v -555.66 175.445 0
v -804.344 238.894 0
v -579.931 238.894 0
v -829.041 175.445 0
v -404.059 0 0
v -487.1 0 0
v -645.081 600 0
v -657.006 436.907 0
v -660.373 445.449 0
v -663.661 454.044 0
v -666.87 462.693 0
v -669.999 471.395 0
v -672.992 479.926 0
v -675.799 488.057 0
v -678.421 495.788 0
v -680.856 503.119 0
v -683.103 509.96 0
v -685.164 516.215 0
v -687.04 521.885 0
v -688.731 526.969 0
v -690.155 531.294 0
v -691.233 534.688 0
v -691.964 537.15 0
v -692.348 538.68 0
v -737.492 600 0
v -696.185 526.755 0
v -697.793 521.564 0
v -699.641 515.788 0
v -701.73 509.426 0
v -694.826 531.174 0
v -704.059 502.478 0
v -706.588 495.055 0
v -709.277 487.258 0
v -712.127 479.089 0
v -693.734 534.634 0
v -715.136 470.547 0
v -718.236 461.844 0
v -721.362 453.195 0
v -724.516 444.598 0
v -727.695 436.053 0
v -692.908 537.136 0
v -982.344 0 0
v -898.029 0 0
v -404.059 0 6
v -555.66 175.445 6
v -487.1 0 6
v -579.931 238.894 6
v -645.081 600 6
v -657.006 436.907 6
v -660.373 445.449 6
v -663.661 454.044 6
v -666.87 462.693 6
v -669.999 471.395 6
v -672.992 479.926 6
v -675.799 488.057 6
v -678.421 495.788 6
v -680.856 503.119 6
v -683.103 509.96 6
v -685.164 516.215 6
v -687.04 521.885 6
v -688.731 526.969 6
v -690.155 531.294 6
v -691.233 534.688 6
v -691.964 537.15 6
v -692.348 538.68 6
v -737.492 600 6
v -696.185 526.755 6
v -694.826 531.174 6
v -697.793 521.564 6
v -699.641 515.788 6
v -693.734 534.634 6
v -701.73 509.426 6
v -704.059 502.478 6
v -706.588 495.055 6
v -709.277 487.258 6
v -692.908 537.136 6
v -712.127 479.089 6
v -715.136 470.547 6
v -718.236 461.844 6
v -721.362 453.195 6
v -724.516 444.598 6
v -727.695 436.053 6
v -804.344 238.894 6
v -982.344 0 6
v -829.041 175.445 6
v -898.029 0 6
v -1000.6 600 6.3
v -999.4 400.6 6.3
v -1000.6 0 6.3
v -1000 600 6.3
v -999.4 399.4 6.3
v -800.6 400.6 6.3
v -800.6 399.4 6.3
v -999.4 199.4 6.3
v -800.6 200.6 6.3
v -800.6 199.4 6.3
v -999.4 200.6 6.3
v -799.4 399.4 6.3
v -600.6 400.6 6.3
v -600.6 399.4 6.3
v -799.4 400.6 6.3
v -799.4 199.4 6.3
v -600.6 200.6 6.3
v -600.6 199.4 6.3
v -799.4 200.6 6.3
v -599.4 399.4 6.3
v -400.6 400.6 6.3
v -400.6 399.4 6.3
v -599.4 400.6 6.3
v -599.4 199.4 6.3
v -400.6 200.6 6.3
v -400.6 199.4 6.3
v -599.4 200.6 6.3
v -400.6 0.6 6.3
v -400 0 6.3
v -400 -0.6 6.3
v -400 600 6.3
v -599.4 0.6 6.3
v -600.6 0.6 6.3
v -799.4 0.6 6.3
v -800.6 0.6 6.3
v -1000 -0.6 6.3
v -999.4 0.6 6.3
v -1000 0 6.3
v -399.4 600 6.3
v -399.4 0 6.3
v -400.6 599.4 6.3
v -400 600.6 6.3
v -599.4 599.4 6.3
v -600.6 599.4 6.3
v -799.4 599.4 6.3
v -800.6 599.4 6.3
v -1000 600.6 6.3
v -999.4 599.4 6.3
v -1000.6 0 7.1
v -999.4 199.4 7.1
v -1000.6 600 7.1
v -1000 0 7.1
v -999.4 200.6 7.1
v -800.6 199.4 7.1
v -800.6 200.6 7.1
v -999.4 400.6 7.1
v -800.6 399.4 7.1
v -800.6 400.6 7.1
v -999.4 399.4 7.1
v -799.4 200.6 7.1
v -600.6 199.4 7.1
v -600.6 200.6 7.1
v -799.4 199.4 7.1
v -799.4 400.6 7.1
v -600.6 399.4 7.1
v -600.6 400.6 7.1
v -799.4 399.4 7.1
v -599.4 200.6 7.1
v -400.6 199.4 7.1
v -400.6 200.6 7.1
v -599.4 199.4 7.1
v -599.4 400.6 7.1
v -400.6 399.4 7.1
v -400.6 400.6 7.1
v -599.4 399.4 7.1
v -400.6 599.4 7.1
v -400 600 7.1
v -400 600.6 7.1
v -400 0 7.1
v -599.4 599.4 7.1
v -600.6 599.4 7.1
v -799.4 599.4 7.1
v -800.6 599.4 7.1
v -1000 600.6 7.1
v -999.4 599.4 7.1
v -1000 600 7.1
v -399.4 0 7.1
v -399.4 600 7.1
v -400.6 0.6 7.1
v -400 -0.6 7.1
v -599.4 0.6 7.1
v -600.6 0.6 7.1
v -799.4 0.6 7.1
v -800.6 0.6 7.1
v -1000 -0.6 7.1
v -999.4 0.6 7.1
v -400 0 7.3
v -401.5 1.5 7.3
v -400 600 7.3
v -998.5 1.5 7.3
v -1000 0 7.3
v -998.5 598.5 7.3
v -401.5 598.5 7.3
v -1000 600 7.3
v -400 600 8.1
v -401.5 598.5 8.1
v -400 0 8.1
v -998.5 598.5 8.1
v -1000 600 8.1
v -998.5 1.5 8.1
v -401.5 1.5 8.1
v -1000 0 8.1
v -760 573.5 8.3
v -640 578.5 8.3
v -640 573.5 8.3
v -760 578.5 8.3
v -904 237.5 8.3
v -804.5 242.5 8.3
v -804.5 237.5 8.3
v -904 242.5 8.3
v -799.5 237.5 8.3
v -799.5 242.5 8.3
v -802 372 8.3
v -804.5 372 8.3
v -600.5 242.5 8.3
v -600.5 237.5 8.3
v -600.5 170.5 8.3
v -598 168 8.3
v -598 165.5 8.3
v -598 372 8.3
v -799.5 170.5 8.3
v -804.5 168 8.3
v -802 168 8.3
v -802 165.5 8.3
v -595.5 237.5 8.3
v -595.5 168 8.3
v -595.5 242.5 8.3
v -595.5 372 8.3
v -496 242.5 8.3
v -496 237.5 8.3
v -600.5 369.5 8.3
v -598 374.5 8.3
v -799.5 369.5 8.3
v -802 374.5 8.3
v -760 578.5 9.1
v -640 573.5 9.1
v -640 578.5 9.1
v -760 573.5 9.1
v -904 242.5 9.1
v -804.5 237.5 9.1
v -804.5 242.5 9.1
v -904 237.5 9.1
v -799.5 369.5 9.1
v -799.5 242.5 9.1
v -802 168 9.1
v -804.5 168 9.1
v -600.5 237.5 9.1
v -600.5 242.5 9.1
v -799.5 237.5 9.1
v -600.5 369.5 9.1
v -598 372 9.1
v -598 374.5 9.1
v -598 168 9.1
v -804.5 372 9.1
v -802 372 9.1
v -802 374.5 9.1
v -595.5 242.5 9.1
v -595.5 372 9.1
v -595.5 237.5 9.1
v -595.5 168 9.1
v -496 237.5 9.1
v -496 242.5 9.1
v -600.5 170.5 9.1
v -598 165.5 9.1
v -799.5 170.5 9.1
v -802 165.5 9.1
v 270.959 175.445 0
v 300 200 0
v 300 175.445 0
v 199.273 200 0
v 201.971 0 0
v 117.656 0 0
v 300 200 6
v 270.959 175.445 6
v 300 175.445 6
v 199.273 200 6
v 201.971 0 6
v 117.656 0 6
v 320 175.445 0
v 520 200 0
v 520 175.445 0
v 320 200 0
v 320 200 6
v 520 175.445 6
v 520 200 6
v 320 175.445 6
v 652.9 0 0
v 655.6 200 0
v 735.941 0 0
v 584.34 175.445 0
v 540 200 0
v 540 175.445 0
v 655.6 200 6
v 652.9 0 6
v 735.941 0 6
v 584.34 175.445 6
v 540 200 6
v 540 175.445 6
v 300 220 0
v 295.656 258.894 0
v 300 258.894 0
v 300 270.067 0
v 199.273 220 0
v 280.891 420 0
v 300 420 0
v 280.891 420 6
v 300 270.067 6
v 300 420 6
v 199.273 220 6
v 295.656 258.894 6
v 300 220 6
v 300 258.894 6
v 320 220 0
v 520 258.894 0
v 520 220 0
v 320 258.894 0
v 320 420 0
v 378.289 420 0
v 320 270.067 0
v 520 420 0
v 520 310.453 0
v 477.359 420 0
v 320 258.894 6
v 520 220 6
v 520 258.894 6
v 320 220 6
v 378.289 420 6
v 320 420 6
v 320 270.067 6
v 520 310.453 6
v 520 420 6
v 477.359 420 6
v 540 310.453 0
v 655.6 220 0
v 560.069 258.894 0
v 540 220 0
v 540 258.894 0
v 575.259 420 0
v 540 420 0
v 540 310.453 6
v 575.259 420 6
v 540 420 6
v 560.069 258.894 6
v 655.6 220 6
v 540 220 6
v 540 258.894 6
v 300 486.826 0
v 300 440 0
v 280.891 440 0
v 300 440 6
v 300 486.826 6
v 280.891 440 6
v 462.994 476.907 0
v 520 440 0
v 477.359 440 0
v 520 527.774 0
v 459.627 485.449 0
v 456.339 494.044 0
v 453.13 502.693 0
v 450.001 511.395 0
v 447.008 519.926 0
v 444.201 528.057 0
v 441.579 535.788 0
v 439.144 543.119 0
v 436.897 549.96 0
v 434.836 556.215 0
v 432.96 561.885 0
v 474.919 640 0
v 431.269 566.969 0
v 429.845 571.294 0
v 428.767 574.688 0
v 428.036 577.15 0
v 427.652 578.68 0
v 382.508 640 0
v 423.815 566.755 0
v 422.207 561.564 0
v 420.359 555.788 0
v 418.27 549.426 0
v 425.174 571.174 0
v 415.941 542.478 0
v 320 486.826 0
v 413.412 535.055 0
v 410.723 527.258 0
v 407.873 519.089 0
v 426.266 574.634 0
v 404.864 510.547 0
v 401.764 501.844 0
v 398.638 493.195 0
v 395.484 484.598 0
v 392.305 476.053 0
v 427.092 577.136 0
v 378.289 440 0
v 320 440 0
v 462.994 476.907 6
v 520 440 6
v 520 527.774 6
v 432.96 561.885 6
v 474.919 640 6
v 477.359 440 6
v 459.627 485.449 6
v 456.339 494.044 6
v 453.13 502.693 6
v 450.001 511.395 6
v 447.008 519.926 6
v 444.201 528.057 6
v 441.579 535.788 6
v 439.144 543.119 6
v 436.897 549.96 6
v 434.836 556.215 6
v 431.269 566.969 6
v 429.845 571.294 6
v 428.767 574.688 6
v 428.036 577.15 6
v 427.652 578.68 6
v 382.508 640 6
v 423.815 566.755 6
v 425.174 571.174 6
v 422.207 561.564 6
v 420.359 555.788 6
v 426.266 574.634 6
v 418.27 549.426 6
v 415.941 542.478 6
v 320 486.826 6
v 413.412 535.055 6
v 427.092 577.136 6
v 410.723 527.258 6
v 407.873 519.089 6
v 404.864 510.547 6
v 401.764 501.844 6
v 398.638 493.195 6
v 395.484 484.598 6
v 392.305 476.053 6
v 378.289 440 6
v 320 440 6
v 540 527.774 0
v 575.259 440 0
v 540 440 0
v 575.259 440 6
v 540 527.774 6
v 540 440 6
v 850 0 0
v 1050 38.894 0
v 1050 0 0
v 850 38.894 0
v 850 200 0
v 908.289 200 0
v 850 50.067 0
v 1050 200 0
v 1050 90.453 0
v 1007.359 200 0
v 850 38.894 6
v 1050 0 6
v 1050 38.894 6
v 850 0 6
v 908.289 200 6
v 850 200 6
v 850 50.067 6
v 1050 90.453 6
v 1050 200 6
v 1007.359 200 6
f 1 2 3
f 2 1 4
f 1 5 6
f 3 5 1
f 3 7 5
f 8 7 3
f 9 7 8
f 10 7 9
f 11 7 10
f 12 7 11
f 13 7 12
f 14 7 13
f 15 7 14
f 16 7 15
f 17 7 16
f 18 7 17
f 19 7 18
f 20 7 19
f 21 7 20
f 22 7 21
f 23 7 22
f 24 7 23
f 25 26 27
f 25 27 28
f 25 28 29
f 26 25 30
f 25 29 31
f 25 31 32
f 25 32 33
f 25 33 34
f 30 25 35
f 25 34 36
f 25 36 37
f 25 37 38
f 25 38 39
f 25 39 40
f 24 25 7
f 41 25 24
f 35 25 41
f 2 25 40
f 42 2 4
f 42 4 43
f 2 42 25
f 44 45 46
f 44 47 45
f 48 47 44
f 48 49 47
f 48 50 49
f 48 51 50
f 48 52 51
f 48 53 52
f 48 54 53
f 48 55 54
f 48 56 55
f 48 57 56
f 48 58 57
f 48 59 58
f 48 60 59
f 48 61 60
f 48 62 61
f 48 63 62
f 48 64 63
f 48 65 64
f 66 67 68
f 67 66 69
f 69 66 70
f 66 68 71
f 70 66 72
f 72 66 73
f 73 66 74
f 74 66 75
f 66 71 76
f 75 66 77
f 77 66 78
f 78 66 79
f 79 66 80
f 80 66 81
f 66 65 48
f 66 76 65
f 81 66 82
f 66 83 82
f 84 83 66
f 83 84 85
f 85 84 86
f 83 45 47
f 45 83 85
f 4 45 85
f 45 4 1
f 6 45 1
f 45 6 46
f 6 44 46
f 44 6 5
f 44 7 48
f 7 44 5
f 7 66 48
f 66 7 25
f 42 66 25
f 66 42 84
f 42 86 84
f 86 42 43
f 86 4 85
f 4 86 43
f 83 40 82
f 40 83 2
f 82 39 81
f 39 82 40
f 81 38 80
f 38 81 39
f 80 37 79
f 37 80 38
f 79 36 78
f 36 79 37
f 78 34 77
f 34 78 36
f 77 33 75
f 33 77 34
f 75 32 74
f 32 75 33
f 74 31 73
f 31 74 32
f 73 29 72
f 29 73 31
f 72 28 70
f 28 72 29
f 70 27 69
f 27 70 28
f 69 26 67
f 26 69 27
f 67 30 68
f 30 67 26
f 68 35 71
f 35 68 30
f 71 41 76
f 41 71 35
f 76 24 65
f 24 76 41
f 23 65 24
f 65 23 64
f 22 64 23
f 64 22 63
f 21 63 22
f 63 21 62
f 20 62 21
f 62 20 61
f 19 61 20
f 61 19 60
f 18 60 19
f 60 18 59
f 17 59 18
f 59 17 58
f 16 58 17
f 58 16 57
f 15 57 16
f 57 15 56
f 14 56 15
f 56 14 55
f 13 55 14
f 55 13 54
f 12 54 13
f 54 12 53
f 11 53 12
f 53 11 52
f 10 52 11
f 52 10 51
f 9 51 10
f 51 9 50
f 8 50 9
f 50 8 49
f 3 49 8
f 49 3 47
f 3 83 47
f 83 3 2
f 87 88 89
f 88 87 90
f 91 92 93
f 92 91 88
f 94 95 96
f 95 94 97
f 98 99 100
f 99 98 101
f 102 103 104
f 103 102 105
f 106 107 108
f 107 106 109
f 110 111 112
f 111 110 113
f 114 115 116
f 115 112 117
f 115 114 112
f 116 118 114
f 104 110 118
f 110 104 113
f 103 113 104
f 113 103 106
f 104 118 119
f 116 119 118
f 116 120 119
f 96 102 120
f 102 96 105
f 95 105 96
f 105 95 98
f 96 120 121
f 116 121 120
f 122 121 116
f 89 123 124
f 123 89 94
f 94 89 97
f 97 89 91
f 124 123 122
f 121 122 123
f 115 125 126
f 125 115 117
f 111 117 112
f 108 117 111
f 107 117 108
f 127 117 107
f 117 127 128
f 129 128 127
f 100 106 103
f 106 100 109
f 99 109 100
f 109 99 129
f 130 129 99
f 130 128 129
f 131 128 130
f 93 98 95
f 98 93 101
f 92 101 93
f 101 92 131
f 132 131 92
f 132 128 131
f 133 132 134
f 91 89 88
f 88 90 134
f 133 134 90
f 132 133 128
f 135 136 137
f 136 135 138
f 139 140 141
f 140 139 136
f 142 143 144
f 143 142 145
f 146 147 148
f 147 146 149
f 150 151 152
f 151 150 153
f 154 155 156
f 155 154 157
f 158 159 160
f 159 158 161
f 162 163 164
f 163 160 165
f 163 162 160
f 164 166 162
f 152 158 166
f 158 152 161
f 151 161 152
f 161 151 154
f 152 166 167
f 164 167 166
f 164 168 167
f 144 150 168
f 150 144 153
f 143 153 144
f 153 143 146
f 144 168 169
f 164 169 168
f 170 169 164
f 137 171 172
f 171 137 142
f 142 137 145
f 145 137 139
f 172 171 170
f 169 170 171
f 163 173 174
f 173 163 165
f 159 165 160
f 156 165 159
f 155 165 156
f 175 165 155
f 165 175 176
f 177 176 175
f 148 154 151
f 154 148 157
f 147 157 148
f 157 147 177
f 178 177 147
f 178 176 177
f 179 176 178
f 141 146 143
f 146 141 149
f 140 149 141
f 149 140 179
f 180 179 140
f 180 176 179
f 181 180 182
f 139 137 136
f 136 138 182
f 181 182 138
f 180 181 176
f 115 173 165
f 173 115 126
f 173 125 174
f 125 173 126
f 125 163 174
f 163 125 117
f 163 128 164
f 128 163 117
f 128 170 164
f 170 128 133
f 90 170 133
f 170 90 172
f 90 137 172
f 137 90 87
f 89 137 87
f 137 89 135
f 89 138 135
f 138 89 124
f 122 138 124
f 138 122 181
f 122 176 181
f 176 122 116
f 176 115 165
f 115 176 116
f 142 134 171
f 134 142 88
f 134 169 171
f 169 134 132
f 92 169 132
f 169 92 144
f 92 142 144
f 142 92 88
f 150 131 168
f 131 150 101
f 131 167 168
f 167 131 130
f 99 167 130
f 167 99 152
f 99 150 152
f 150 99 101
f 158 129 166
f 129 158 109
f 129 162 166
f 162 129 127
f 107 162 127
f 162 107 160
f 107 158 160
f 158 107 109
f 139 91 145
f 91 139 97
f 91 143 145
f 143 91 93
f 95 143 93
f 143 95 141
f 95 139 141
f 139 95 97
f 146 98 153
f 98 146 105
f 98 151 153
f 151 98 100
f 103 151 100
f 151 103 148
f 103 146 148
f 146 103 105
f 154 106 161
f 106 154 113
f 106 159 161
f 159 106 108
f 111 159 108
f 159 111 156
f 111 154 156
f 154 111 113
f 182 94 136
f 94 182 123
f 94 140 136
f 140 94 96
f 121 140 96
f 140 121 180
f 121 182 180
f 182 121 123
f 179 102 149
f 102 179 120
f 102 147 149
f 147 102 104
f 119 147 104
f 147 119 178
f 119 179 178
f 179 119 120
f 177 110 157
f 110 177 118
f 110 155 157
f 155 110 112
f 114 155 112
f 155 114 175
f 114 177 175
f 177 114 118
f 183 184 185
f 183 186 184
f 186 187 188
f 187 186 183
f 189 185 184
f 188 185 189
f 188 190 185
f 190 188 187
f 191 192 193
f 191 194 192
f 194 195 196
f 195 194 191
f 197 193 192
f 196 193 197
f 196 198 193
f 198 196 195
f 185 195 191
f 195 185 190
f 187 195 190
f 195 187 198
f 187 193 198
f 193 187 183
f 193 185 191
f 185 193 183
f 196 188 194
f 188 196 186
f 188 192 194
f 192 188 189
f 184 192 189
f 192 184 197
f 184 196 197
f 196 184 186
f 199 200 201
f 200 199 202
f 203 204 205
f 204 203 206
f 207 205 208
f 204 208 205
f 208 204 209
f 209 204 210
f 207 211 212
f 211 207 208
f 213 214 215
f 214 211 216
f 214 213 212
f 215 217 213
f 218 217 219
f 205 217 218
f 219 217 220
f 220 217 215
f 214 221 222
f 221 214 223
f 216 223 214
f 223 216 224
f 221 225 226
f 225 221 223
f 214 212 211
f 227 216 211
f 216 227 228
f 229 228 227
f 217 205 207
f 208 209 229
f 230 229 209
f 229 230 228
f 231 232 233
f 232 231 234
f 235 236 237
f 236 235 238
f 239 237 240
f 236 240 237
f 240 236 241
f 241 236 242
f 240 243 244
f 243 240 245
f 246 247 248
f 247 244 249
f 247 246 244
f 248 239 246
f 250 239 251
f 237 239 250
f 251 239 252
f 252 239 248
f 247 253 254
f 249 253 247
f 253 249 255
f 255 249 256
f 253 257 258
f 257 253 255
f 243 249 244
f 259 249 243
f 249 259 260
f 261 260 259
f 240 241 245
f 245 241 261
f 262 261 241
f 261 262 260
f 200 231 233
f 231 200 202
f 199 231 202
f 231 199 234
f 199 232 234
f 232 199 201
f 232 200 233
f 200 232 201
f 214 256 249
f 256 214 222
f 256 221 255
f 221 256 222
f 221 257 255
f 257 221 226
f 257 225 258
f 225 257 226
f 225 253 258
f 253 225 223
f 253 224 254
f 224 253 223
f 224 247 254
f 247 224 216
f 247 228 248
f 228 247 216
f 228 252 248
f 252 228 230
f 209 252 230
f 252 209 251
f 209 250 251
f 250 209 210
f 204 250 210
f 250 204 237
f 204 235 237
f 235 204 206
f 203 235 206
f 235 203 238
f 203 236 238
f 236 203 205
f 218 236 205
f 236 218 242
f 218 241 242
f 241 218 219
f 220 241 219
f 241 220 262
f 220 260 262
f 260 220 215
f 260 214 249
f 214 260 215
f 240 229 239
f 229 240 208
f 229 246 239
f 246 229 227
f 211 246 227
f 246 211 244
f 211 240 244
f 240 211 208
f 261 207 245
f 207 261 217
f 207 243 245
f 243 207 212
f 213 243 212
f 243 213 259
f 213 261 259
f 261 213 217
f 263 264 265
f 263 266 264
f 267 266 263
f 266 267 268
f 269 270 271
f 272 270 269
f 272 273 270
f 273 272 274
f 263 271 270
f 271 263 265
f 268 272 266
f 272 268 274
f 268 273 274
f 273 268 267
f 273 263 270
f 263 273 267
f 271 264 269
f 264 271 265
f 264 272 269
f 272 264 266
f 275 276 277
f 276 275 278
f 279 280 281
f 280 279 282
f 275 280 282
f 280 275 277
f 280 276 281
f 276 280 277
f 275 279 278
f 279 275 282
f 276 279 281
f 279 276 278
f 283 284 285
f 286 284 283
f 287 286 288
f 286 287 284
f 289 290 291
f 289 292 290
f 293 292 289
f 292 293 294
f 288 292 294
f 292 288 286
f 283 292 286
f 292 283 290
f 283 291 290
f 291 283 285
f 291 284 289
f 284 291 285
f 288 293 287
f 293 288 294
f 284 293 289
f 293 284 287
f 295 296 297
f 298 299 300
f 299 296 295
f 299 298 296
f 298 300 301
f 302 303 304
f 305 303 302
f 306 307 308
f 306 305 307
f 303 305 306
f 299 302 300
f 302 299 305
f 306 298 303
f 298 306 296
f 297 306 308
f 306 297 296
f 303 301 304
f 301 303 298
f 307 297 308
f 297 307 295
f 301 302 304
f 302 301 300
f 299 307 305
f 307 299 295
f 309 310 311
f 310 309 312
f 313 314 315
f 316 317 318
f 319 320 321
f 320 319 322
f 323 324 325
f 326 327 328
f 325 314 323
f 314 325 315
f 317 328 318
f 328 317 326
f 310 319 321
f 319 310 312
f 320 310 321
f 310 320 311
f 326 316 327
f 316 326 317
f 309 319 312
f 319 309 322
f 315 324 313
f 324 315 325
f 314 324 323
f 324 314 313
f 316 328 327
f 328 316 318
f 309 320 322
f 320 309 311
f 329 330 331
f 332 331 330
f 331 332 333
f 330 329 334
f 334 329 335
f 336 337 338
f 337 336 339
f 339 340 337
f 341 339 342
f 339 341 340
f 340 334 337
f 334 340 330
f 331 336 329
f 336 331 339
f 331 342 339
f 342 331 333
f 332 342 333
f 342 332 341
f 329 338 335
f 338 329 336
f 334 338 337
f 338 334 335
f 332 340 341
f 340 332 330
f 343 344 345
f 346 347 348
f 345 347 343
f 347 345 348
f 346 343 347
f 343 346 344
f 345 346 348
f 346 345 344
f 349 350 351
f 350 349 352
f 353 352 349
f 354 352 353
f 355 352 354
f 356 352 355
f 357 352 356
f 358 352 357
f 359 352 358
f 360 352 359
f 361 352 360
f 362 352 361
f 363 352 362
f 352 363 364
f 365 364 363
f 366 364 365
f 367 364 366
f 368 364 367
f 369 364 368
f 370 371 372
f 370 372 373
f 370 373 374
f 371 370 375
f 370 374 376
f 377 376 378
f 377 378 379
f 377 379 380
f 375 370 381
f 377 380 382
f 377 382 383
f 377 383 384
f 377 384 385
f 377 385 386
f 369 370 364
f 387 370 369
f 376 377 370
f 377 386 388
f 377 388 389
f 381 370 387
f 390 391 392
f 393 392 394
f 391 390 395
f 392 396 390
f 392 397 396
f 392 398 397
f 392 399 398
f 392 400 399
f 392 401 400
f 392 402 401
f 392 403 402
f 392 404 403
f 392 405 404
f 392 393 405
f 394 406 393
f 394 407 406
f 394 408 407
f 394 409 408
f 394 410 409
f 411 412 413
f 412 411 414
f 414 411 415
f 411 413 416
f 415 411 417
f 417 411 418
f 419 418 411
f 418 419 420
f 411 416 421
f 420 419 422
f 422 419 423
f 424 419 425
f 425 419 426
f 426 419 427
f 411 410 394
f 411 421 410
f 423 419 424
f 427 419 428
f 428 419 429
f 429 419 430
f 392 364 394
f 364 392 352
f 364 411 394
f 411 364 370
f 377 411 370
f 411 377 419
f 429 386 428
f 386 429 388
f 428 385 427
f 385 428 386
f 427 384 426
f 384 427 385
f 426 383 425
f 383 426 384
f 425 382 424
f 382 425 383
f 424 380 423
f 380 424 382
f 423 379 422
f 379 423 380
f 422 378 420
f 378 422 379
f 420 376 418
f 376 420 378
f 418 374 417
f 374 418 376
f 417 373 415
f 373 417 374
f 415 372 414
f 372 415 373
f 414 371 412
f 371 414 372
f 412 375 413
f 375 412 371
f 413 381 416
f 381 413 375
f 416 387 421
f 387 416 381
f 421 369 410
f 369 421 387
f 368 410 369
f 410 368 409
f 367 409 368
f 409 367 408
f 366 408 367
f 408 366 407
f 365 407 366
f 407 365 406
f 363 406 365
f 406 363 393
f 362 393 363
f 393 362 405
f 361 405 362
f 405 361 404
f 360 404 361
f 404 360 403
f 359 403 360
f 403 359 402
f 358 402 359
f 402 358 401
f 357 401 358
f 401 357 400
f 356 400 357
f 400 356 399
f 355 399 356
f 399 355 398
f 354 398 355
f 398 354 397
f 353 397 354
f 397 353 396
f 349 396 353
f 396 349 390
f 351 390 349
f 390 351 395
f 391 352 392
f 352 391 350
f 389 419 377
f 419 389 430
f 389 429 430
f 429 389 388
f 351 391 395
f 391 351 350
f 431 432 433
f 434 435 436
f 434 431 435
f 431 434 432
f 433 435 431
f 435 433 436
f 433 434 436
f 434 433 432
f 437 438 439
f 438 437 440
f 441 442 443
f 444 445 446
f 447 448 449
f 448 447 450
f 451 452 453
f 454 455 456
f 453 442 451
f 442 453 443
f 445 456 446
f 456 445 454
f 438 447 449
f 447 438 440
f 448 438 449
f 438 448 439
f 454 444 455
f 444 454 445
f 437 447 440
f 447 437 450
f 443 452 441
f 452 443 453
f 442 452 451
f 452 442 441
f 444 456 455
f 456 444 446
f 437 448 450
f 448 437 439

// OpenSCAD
// file: ../geometry/section_scene.scad
//////////////////////////////////////////////////////////////////////
// LibFile: section_scene.scad
// Project: Glyph Dossier
// FileGroup: Section Rendering
// FileSummary: Normalized uppercase-A plan, layout, and export.
//////////////////////////////////////////////////////////////////////

module normalized_glyph_section_3d(
    dossier,
    source,
    method,
    target_height,
    probe_size,
    depth,
    manual_left,
    manual_right,
    manual_bottom,
    manual_top,
    origin_x,
    origin_y,
    cell_width,
    cell_height,
    column,
    row,
    epsilon
) {
    intersection() {
        normalized_glyph_3d(
            dossier,
            source,
            method,
            target_height,
            probe_size,
            depth,
            manual_left,
            manual_right,
            manual_bottom,
            manual_top
        );

        section_cell_clip_3d(
            origin_x,
            origin_y,
            cell_width,
            cell_height,
            column,
            row,
            depth,
            epsilon
        );
    }
}

module render_a_section_plan(
    dossier,
    source,
    method,
    target_height,
    probe_size,
    depth,
    manual_left,
    manual_right,
    manual_bottom,
    manual_top,
    origin_x,
    origin_y,
    cell_width,
    cell_height,
    columns,
    rows,
    show_grid,
    show_hazards,
    show_bounds,
    grid_line_width,
    hazard_line_width,
    bounds_line_width,
    apex_y_ratio,
    counter_bottom_ratio,
    counter_top_ratio,
    crossbar_y_ratio,
    counter_half_width_ratio
) {
    color([0.88, 0.68, 0.24])
        normalized_glyph_3d(
            dossier,
            source,
            method,
            target_height,
            probe_size,
            depth,
            manual_left,
            manual_right,
            manual_bottom,
            manual_top
        );

    if (show_grid)
        color([0.20, 0.45, 0.85, 0.65])
            translate([0, 0, depth + 0.3])
                section_grid_3d(
                    origin_x,
                    origin_y,
                    cell_width,
                    cell_height,
                    columns,
                    rows,
                    grid_line_width,
                    0.8
                );

    if (show_bounds)
        color([0.15, 0.70, 0.42, 0.55])
            translate([0, 0, depth + 1.3])
                linear_extrude(height = 0.8)
                    normalized_reference_bounds_2d(
                        target_height,
                        section_plan_width(
                            cell_width,
                            columns
                        ) / 2,
                        bounds_line_width
                    );

    if (show_hazards)
        color([0.88, 0.22, 0.18, 0.70])
            translate([0, 0, depth + 2.3])
                a_hazard_guides_3d(
                    target_height,
                    apex_y_ratio,
                    counter_bottom_ratio,
                    counter_top_ratio,
                    crossbar_y_ratio,
                    counter_half_width_ratio,
                    hazard_line_width,
                    0.8
                );
}

module render_a_section_layout(
    dossier,
    source,
    method,
    target_height,
    probe_size,
    depth,
    manual_left,
    manual_right,
    manual_bottom,
    manual_top,
    origin_x,
    origin_y,
    cell_width,
    cell_height,
    columns,
    rows,
    epsilon,
    gap
) {
    for (row = [0 : rows - 1])
        for (column = [0 : columns - 1])
            translate([
                section_layout_x(
                    column,
                    cell_width,
                    gap
                )
                    - section_x0(
                        origin_x,
                        cell_width,
                        column
                    ),
                section_layout_y(
                    row,
                    cell_height,
                    gap
                )
                    - section_y0(
                        origin_y,
                        cell_height,
                        row
                    ),
                0
            ])
                color([0.88, 0.68, 0.24])
                    normalized_glyph_section_3d(
                        dossier,
                        source,
                        method,
                        target_height,
                        probe_size,
                        depth,
                        manual_left,
                        manual_right,
                        manual_bottom,
                        manual_top,
                        origin_x,
                        origin_y,
                        cell_width,
                        cell_height,
                        column,
                        row,
                        epsilon
                    );
}

module render_a_section_export(
    dossier,
    source,
    method,
    target_height,
    probe_size,
    depth,
    manual_left,
    manual_right,
    manual_bottom,
    manual_top,
    origin_x,
    origin_y,
    cell_width,
    cell_height,
    column,
    row,
    epsilon
) {
    translate([
        -section_x0(
            origin_x,
            cell_width,
            column
        ),
        -section_y0(
            origin_y,
            cell_height,
            row
        ),
        0
    ])
        normalized_glyph_section_3d(
            dossier,
            source,
            method,
            target_height,
            probe_size,
            depth,
            manual_left,
            manual_right,
            manual_bottom,
            manual_top,
            origin_x,
            origin_y,
            cell_width,
            cell_height,
            column,
            row,
            epsilon
        );
}
// file: ../geometry/normalized_profile_scene.scad
//////////////////////////////////////////////////////////////////////
// LibFile: normalized_profile_scene.scad
// Project: Glyph Dossier
// FileGroup: Exact-Height Diagnostic Rendering
// FileSummary: Whole normalized A with target-height reference bounds.
//////////////////////////////////////////////////////////////////////

module normalized_reference_bounds_2d(
    target_height,
    reference_half_width,
    line_width
) {
    difference() {
        translate([0, target_height / 2])
            square(
                [
                    2 * reference_half_width,
                    target_height
                ],
                center = true
            );

        translate([0, target_height / 2])
            square(
                [
                    max(
                        0.01,
                        2 * reference_half_width
                            - 2 * line_width
                    ),
                    max(
                        0.01,
                        target_height
                            - 2 * line_width
                    )
                ],
                center = true
            );
    }
}

module render_normalized_profile(
    dossier,
    source,
    method,
    target_height,
    probe_size,
    depth,
    manual_left,
    manual_right,
    manual_bottom,
    manual_top,
    show_bounds,
    bounds_line_width,
    reference_half_width
) {
    color([0.88, 0.68, 0.24])
        normalized_glyph_3d(
            dossier,
            source,
            method,
            target_height,
            probe_size,
            depth,
            manual_left,
            manual_right,
            manual_bottom,
            manual_top
        );

    if (show_bounds)
        color([0.20, 0.45, 0.85, 0.55])
            translate([0, 0, depth + 0.3])
                linear_extrude(height = 0.8)
                    normalized_reference_bounds_2d(
                        target_height,
                        reference_half_width,
                        bounds_line_width
                    );
}
// file: ../geometry/normalized_glyph.scad
//////////////////////////////////////////////////////////////////////
// LibFile: normalized_glyph.scad
// Project: Glyph Dossier
// FileGroup: Exact-Height Geometry
// FileSummary: Center-bottom glyph normalization by three methods.
//////////////////////////////////////////////////////////////////////

module _source_text_left_baseline_2d(
    dossier,
    source,
    probe_size
) {
    font_text_2d(
        dossier[GD_GLYPH],
        source[FS_FONT_NAME],
        probe_size,
        "left",
        "baseline"
    );
}

module _source_text_center_bottom_2d(
    dossier,
    source,
    probe_size
) {
    font_text_2d(
        dossier[GD_GLYPH],
        source[FS_FONT_NAME],
        probe_size,
        "center",
        "bottom"
    );
}

module _manual_normalized_glyph_2d(
    dossier,
    source,
    target_height,
    probe_size,
    left,
    right,
    bottom,
    top
) {
    scale_factor = exact_height_scale(
        target_height,
        bottom,
        top
    );

    translate([
        normalized_center_shift_x(
            left,
            right,
            scale_factor
        ),
        normalized_bottom_shift_y(
            bottom,
            scale_factor
        )
    ])
        scale([scale_factor, scale_factor])
            _source_text_left_baseline_2d(
                dossier,
                source,
                probe_size
            );
}

module _resize_normalized_glyph_2d(
    dossier,
    source,
    target_height,
    probe_size
) {
    resize(
        [0, target_height],
        auto = [true, false]
    )
        _source_text_center_bottom_2d(
            dossier,
            source,
            probe_size
        );
}

module _textmetrics_normalized_glyph_2d(
    dossier,
    source,
    target_height,
    probe_size
) {
    if (source[FS_FONT_NAME] == "")
        let(
            metrics = textmetrics(
                text = dossier[GD_GLYPH],
                size = probe_size,
                halign = "left",
                valign = "baseline"
            ),
            scale_factor =
                target_height / metrics.size.y,
            center_x =
                metrics.position.x
                + metrics.size.x / 2
        ) {
            echo("TEXTMETRICS_PROFILE", metrics);
            echo(
                "NORMALIZATION_SCALE",
                scale_factor
            );
            echo(
                "NORMALIZED_PROFILE_WIDTH_MM",
                metrics.size.x * scale_factor
            );
            echo(
                "NORMALIZED_PROFILE_HEIGHT_MM",
                target_height
            );

            translate([
                -center_x * scale_factor,
                -metrics.position.y * scale_factor
            ])
                scale([scale_factor, scale_factor])
                    _source_text_left_baseline_2d(
                        dossier,
                        source,
                        probe_size
                    );
        }
    else
        let(
            metrics = textmetrics(
                text = dossier[GD_GLYPH],
                size = probe_size,
                font = source[FS_FONT_NAME],
                halign = "left",
                valign = "baseline"
            ),
            scale_factor =
                target_height / metrics.size.y,
            center_x =
                metrics.position.x
                + metrics.size.x / 2
        ) {
            echo("TEXTMETRICS_PROFILE", metrics);
            echo(
                "NORMALIZATION_SCALE",
                scale_factor
            );
            echo(
                "NORMALIZED_PROFILE_WIDTH_MM",
                metrics.size.x * scale_factor
            );
            echo(
                "NORMALIZED_PROFILE_HEIGHT_MM",
                target_height
            );

            translate([
                -center_x * scale_factor,
                -metrics.position.y * scale_factor
            ])
                scale([scale_factor, scale_factor])
                    _source_text_left_baseline_2d(
                        dossier,
                        source,
                        probe_size
                    );
        }
}

module normalized_glyph_2d(
    dossier,
    source,
    method,
    target_height,
    probe_size,
    manual_left,
    manual_right,
    manual_bottom,
    manual_top
) {
    if (method == "manual")
        _manual_normalized_glyph_2d(
            dossier,
            source,
            target_height,
            probe_size,
            manual_left,
            manual_right,
            manual_bottom,
            manual_top
        );
    else if (method == "textmetrics")
        _textmetrics_normalized_glyph_2d(
            dossier,
            source,
            target_height,
            probe_size
        );
    else
        _resize_normalized_glyph_2d(
            dossier,
            source,
            target_height,
            probe_size
        );
}

module normalized_glyph_3d(
    dossier,
    source,
    method,
    target_height,
    probe_size,
    depth,
    manual_left,
    manual_right,
    manual_bottom,
    manual_top
) {
    linear_extrude(height = depth)
        normalized_glyph_2d(
            dossier,
            source,
            method,
            target_height,
            probe_size,
            manual_left,
            manual_right,
            manual_bottom,
            manual_top
        );
}
// file: ../geometry/a_hazard_map.scad
//////////////////////////////////////////////////////////////////////
// LibFile: a_hazard_map.scad
// Project: Glyph Dossier
// FileGroup: Character-Specific Analysis
// FileSummary: Nominal uppercase-A apex, counter, and crossbar guides.
//////////////////////////////////////////////////////////////////////

module _hazard_horizontal_line_2d(
    y,
    half_width,
    line_width
) {
    translate([0, y])
        square(
            [2 * half_width, line_width],
            center = true
        );
}

module _hazard_vertical_line_2d(
    x,
    y0,
    y1,
    line_width
) {
    translate([x, (y0 + y1) / 2])
        square(
            [line_width, y1 - y0],
            center = true
        );
}

module a_hazard_guides_2d(
    nominal_size,
    apex_y_ratio,
    counter_bottom_ratio,
    counter_top_ratio,
    crossbar_y_ratio,
    counter_half_width_ratio,
    line_width
) {
    apex_y = nominal_size * apex_y_ratio;
    counter_bottom = nominal_size * counter_bottom_ratio;
    counter_top = nominal_size * counter_top_ratio;
    crossbar_y = nominal_size * crossbar_y_ratio;
    counter_half_width =
        nominal_size * counter_half_width_ratio;
    apex_half_width = nominal_size * 0.10;
    crossbar_half_width = nominal_size * 0.34;

    union() {
        _hazard_horizontal_line_2d(
            apex_y,
            apex_half_width,
            line_width
        );

        _hazard_horizontal_line_2d(
            counter_bottom,
            counter_half_width,
            line_width
        );

        _hazard_horizontal_line_2d(
            counter_top,
            counter_half_width,
            line_width
        );

        _hazard_vertical_line_2d(
            -counter_half_width,
            counter_bottom,
            counter_top,
            line_width
        );

        _hazard_vertical_line_2d(
            counter_half_width,
            counter_bottom,
            counter_top,
            line_width
        );

        _hazard_horizontal_line_2d(
            crossbar_y,
            crossbar_half_width,
            line_width
        );
    }
}

module a_hazard_guides_3d(
    nominal_size,
    apex_y_ratio,
    counter_bottom_ratio,
    counter_top_ratio,
    crossbar_y_ratio,
    counter_half_width_ratio,
    line_width,
    depth
) {
    linear_extrude(height = depth)
        a_hazard_guides_2d(
            nominal_size,
            apex_y_ratio,
            counter_bottom_ratio,
            counter_top_ratio,
            crossbar_y_ratio,
            counter_half_width_ratio,
            line_width
        );
}
// file: ../geometry/section_grid.scad
//////////////////////////////////////////////////////////////////////
// LibFile: section_grid.scad
// Project: Glyph Dossier
// FileGroup: Section Geometry
// FileSummary: Rectangular clipping cells and preview grid.
//////////////////////////////////////////////////////////////////////

module section_cell_clip_3d(
    origin_x,
    origin_y,
    cell_width,
    cell_height,
    column,
    row,
    depth,
    epsilon
) {
    translate([
        section_x0(origin_x, cell_width, column),
        section_y0(origin_y, cell_height, row),
        -epsilon
    ])
        cube([
            cell_width,
            cell_height,
            depth + 2 * epsilon
        ]);
}

module _vertical_grid_line_2d(
    x,
    y0,
    height,
    line_width
) {
    translate([x, y0 + height / 2])
        square([line_width, height], center = true);
}

module _horizontal_grid_line_2d(
    x0,
    y,
    width,
    line_width
) {
    translate([x0 + width / 2, y])
        square([width, line_width], center = true);
}

module section_grid_2d(
    origin_x,
    origin_y,
    cell_width,
    cell_height,
    columns,
    rows,
    line_width
) {
    total_width = section_plan_width(cell_width, columns);
    total_height = section_plan_height(cell_height, rows);

    union() {
        for (column = [0 : columns])
            _vertical_grid_line_2d(
                origin_x + column * cell_width,
                origin_y,
                total_height,
                line_width
            );

        for (row = [0 : rows])
            _horizontal_grid_line_2d(
                origin_x,
                origin_y + row * cell_height,
                total_width,
                line_width
            );
    }
}

module section_grid_3d(
    origin_x,
    origin_y,
    cell_width,
    cell_height,
    columns,
    rows,
    line_width,
    depth
) {
    linear_extrude(height = depth)
        section_grid_2d(
            origin_x,
            origin_y,
            cell_width,
            cell_height,
            columns,
            rows,
            line_width
        );
}
// file: ../geometry/glyph_profile.scad
//////////////////////////////////////////////////////////////////////
// LibFile: glyph_profile.scad
// Project: Glyph Dossier
// FileGroup: Source Adapter
// FileSummary: Font-backed text, glyph, source, and extrusion adapters.
//////////////////////////////////////////////////////////////////////

module font_text_2d(
    value,
    font_name,
    nominal_size,
    halign_value = "center",
    valign_value = "baseline"
) {
    if (font_name == "")
        text(
            text = value,
            size = nominal_size,
            halign = halign_value,
            valign = valign_value
        );
    else
        text(
            text = value,
            size = nominal_size,
            font = font_name,
            halign = halign_value,
            valign = valign_value
        );
}

module font_glyph_2d(glyph, font_name, nominal_size) {
    font_text_2d(
        glyph,
        font_name,
        nominal_size,
        "center",
        "baseline"
    );
}

module glyph_source_2d(
    dossier,
    source_kind,
    font_name,
    nominal_size
) {
    assert(
        source_kind == "font",
        str("Source adapter does not implement kind: ", source_kind)
    );

    font_glyph_2d(
        dossier[GD_GLYPH],
        font_name,
        nominal_size
    );
}

module glyph_profile_3d(
    dossier,
    source_kind,
    font_name,
    nominal_size,
    depth
) {
    linear_extrude(height = depth)
        glyph_source_2d(
            dossier,
            source_kind,
            font_name,
            nominal_size
        );
}

module glyph_source_record_2d(
    dossier,
    source,
    nominal_size
) {
    glyph_source_2d(
        dossier,
        source[FS_KIND],
        source[FS_FONT_NAME],
        nominal_size
    );
}

module glyph_source_record_3d(
    dossier,
    source,
    nominal_size,
    depth
) {
    glyph_profile_3d(
        dossier,
        source[FS_KIND],
        source[FS_FONT_NAME],
        nominal_size,
        depth
    );
}
// file: ../lib/normalization.scad
//////////////////////////////////////////////////////////////////////
// LibFile: normalization.scad
// Project: Glyph Dossier
// FileGroup: Normalization Mathematics
// FileSummary: Manual-bound scale and final-dimension calculations.
//////////////////////////////////////////////////////////////////////

function profile_bounds_known(
    left,
    right,
    bottom,
    top
) =
    left != OBS_UNKNOWN
    && right != OBS_UNKNOWN
    && bottom != OBS_UNKNOWN
    && top != OBS_UNKNOWN;

function profile_bounds_valid(
    left,
    right,
    bottom,
    top
) =
    profile_bounds_known(left, right, bottom, top)
    && left < right
    && bottom < top;

function profile_observed_width(left, right) =
    right - left;

function profile_observed_height(bottom, top) =
    top - bottom;

function exact_height_scale(
    target_height,
    observed_bottom,
    observed_top
) =
    target_height
    / profile_observed_height(
        observed_bottom,
        observed_top
    );

function normalized_profile_width(
    target_height,
    observed_left,
    observed_right,
    observed_bottom,
    observed_top
) =
    profile_observed_width(
        observed_left,
        observed_right
    )
    * exact_height_scale(
        target_height,
        observed_bottom,
        observed_top
    );

function normalized_center_shift_x(
    observed_left,
    observed_right,
    scale_factor
) =
    -(
        observed_left + observed_right
    ) / 2 * scale_factor;

function normalized_bottom_shift_y(
    observed_bottom,
    scale_factor
) =
    -observed_bottom * scale_factor;
// file: ../lib/sectioning.scad
//////////////////////////////////////////////////////////////////////
// LibFile: sectioning.scad
// Project: Glyph Dossier
// FileGroup: Section Mathematics
// FileSummary: Pure grid bounds, identifiers, and layout functions.
//////////////////////////////////////////////////////////////////////

function section_count(columns, rows) =
    columns * rows;

function section_plan_width(cell_width, columns) =
    cell_width * columns;

function section_plan_height(cell_height, rows) =
    cell_height * rows;

function section_x0(origin_x, cell_width, column) =
    origin_x + column * cell_width;

function section_x1(origin_x, cell_width, column) =
    section_x0(origin_x, cell_width, column) + cell_width;

function section_y0(origin_y, cell_height, row) =
    origin_y + row * cell_height;

function section_y1(origin_y, cell_height, row) =
    section_y0(origin_y, cell_height, row) + cell_height;

function section_id(column, row) =
    str("C", column + 1, "_R", row + 1);

function section_layout_x(column, cell_width, gap) =
    column * (cell_width + gap);

function section_layout_y(row, cell_height, gap) =
    row * (cell_height + gap);
// file: ../lib/lookup.scad
//////////////////////////////////////////////////////////////////////
// LibFile: lookup.scad
// Project: Glyph Dossier
// FileGroup: Exact Lookup
// FileSummary: Requires exact records and source-glyph observations.
//////////////////////////////////////////////////////////////////////

function named_matches(records, name) = [
    for (record = records)
        if (record_name(record) == name)
            record
];

function named_record(records, name, record_kind = "record") =
    let(matches = named_matches(records, name))
    assert(
        len(matches) == 1,
        str(
            "Expected exactly one ",
            record_kind,
            " named ",
            name,
            "; found ",
            len(matches)
        )
    )
    matches[0];

function exact_name_count(records, name) =
    len(named_matches(records, name));

function observation_matches(
    records,
    source_id,
    glyph_id
) = [
    for (record = records)
        if (
            record[OB_SOURCE_ID] == source_id
            && record[OB_GLYPH_ID] == glyph_id
        )
            record
];

function exact_observation_count(
    records,
    source_id,
    glyph_id
) =
    len(observation_matches(records, source_id, glyph_id));

function source_glyph_observation(
    records,
    source_id,
    glyph_id
) =
    let(matches = observation_matches(records, source_id, glyph_id))
    assert(
        len(matches) == 1,
        str(
            "Expected one observation for source ",
            source_id,
            " and glyph ",
            glyph_id,
            "; found ",
            len(matches)
        )
    )
    matches[0];
// file: ../config/workbenches.scad
//////////////////////////////////////////////////////////////////////
// LibFile: workbenches.scad
// Project: Glyph Dossier
// FileGroup: Workbench Contracts
// FileSummary: Declares supported workbenches and render modes.
//////////////////////////////////////////////////////////////////////

VALID_WORKBENCHES = [
    "development",
    "laboratory",
    "profile",
    "contact_sheet",
    "font_source",
    "font_inventory",
    "glyph_observation",
    "glyph_comparison",
    "source_contact_sheet",
    "a_normalized_profile",
    "a_section_plan",
    "a_section_layout",
    "a_section_export",
    "catalog"
];

VALID_RENDER_MODES = [
    "dossier",
    "profile_2d",
    "profile_3d",
    "contact_sheet",
    "source_sample",
    "font_inventory",
    "observation",
    "comparison",
    "source_contact_sheet",
    "a_normalized_profile",
    "a_section_plan",
    "a_section_layout",
    "a_section_export",
    "report_only"
];

VALID_SOURCE_KINDS = [
    "font"
];

VALID_PROBE_ORIENTATIONS = [
    "horizontal",
    "vertical"
];

VALID_NORMALIZATION_METHODS = [
    "resize",
    "manual",
    "textmetrics"
];

function value_in_list(values, value) =
    len([for (candidate = values) if (candidate == value) candidate]) > 0;

module validate_workbench_selection(
    workbench_name,
    render_mode,
    source_kind,
    stroke_probe_orientation = "vertical",
    gap_probe_orientation = "horizontal"
) {
    assert(
        value_in_list(VALID_WORKBENCHES, workbench_name),
        str("Unknown workbench: ", workbench_name)
    );
    assert(
        value_in_list(VALID_RENDER_MODES, render_mode),
        str("Unknown render mode: ", render_mode)
    );
    assert(
        value_in_list(VALID_SOURCE_KINDS, source_kind),
        str("Unsupported source kind: ", source_kind)
    );
    assert(
        value_in_list(
            VALID_PROBE_ORIENTATIONS,
            stroke_probe_orientation
        ),
        str(
            "Unknown stroke probe orientation: ",
            stroke_probe_orientation
        )
    );
    assert(
        value_in_list(
            VALID_PROBE_ORIENTATIONS,
            gap_probe_orientation
        ),
        str(
            "Unknown gap probe orientation: ",
            gap_probe_orientation
        )
    );
}
// file: ../config/sources.scad
//////////////////////////////////////////////////////////////////////
// LibFile: sources.scad
// Project: Glyph Dossier
// FileGroup: Registry Routing
// FileSummary: Exposes configurable laboratory font sources.
//////////////////////////////////////////////////////////////////////

FONT_SOURCES = LABORATORY_FONT_SOURCES;
// file: ../registries/laboratory_sources.scad
//////////////////////////////////////////////////////////////////////
// LibFile: laboratory_sources.scad
// Project: Glyph Dossier
// FileGroup: Mutable Source Registry
// FileSummary: Three stable configurable font-source identities.
//////////////////////////////////////////////////////////////////////

LABORATORY_FONT_SOURCES = [
    font_source(
        "SRC_1",
        "font",
        wb_source_1_label,
        wb_source_1_font_name,
        wb_source_1_license,
        wb_source_1_url,
        wb_source_1_revision,
        "active"
    ),
    font_source(
        "SRC_2",
        "font",
        wb_source_2_label,
        wb_source_2_font_name,
        wb_source_2_license,
        wb_source_2_url,
        wb_source_2_revision,
        "active"
    ),
    font_source(
        "SRC_3",
        "font",
        wb_source_3_label,
        wb_source_3_font_name,
        wb_source_3_license,
        wb_source_3_url,
        wb_source_3_revision,
        "active"
    )
];
// file: ../config/glyphs.scad
//////////////////////////////////////////////////////////////////////
// LibFile: glyphs.scad
// Project: Glyph Dossier
// FileGroup: Registry Composition
// FileSummary: Exposes the complete character-analysis registry.
//////////////////////////////////////////////////////////////////////

ALL_GLYPHS = concat(
    UPPERCASE_GLYPHS,
    LOWERCASE_GLYPHS,
    DIGIT_GLYPHS,
    PUNCTUATION_GLYPHS
);
// file: ../registries/punctuation.scad
//////////////////////////////////////////////////////////////////////
// LibFile: punctuation_glyphs.scad
// Project: Glyph Dossier
// FileGroup: Character Registry
// FileSummary: Character-level dossiers for question, exclamation, colon, and semicolon.
//////////////////////////////////////////////////////////////////////

PUNCTUATION_GLYPHS = [
    glyph_dossier(
        "P_question",
        "?",
        "punctuation",
        "curved_mark_dot",
        2,
        2,
        0,
        0,
        "cap_punctuation",
        ["upper_curve", "narrow_transition", "terminal", "separate_dot"],
        ["dot_loss", "component_assignment", "curve_cut", "narrow_transition"],
        ["curve_shape", "dot_shape", "terminal_angle"],
        "primary",
        "Primary punctuation test combining a complex main mark and separate dot."
    ),
    glyph_dossier(
        "P_exclamation",
        "!",
        "punctuation",
        "stem_dot",
        2,
        2,
        0,
        0,
        "cap_punctuation",
        ["main_stem", "separate_dot"],
        ["dot_loss", "stem_fragment", "component_assignment"],
        ["tapered_stem", "rectangular_stem", "dot_shape"],
        "primary",
        "Primary two-component punctuation control glyph."
    ),
    glyph_dossier(
        "P_colon",
        ":",
        "punctuation",
        "paired_dots",
        2,
        2,
        0,
        0,
        "x_punctuation",
        ["upper_dot", "lower_dot"],
        ["component_loss", "component_assignment", "small_part"],
        ["round_dots", "square_dots"],
        "primary",
        "Primary test consisting entirely of disconnected small components."
    ),
    glyph_dossier(
        "P_semicolon",
        ";",
        "punctuation",
        "dot_descending_mark",
        2,
        2,
        0,
        0,
        "descender_punctuation",
        ["upper_dot", "lower_comma_tail"],
        ["component_loss", "tail_fragment", "component_assignment"],
        ["tail_angle", "dot_shape"],
        "primary",
        "Tests disconnected punctuation with a descending curved component."
    )
];
// file: ../registries/digits.scad
//////////////////////////////////////////////////////////////////////
// LibFile: digit_glyphs.scad
// Project: Glyph Dossier
// FileGroup: Character Registry
// FileSummary: Character-level dossiers for digits 0 through 9.
//////////////////////////////////////////////////////////////////////

DIGIT_GLYPHS = [
    glyph_dossier(
        "D_0",
        "0",
        "digit",
        "closed_ring",
        1,
        1,
        1,
        1,
        "digit_height",
        ["outer_curve", "counter", "continuous_ring"],
        ["counter_collapse", "ring_thickness_loss", "letter_confusion"],
        ["slashed_zero", "dotted_zero", "oval_width"],
        "primary",
        "Primary digit ring test and distinction from uppercase O."
    ),
    glyph_dossier(
        "D_1",
        "1",
        "digit",
        "stem_flag_base",
        1,
        1,
        0,
        0,
        "digit_height",
        ["main_stem", "possible_flag", "possible_base"],
        ["narrow_part", "flag_fragment", "base_fragment"],
        ["plain_stem", "top_flag", "bottom_base", "serifed"],
        "primary",
        "Primary font-variation and narrow-digit test."
    ),
    glyph_dossier(
        "D_2",
        "2",
        "digit",
        "curve_diagonal_base",
        1,
        1,
        0,
        0,
        "digit_height",
        ["upper_curve", "diagonal_transition", "bottom_bar"],
        ["curve_diagonal_cut", "bottom_bar_fragment", "thin_transition"],
        ["flat_or_curved_base", "diagonal_angle"],
        "primary",
        "Primary mixed curve, diagonal, and horizontal test."
    ),
    glyph_dossier(
        "D_3",
        "3",
        "digit",
        "double_open_bowl",
        1,
        1,
        0,
        0,
        "digit_height",
        ["upper_curve", "lower_curve", "central_waist"],
        ["waist_fragment", "curve_cut", "terminal_fragment"],
        ["upper_lower_balance", "flat_or_rounded_spine"],
        "coverage",
        "Tests two open curved lobes and a narrow waist."
    ),
    glyph_dossier(
        "D_4",
        "4",
        "digit",
        "crossbar_diagonal_stem",
        1,
        1,
        0,
        1,
        "digit_height",
        ["diagonal", "vertical_stem", "crossbar", "possible_counter"],
        ["form_substitution", "crossbar_cut", "counter_collapse", "junction_cut"],
        ["open_four", "closed_four", "crossbar_height"],
        "primary",
        "Primary digit form-variation and junction test."
    ),
    glyph_dossier(
        "D_5",
        "5",
        "digit",
        "top_stem_lower_curve",
        1,
        1,
        0,
        0,
        "digit_height",
        ["top_bar", "upper_stem", "lower_curve"],
        ["curve_stem_cut", "top_bar_fragment", "waist_fragment"],
        ["flat_or_curved_top", "lower_bowl_size"],
        "coverage",
        "Tests abrupt transition from rectilinear to curved geometry."
    ),
    glyph_dossier(
        "D_6",
        "6",
        "digit",
        "loop_open_tail",
        1,
        1,
        1,
        1,
        "digit_height",
        ["lower_loop", "counter", "upper_open_curve"],
        ["counter_collapse", "neck_cut", "terminal_fragment"],
        ["loop_size", "terminal_angle"],
        "coverage",
        "Tests one counter with an open upper continuation."
    ),
    glyph_dossier(
        "D_7",
        "7",
        "digit",
        "topbar_diagonal",
        1,
        1,
        0,
        0,
        "digit_height",
        ["top_bar", "long_diagonal", "possible_crossbar"],
        ["diagonal_cut", "top_bar_fragment", "crossbar_fragment"],
        ["crossed_seven", "plain_seven", "serifed"],
        "coverage",
        "Tests a long diagonal and optional crossbar."
    ),
    glyph_dossier(
        "D_8",
        "8",
        "digit",
        "double_closed_loop",
        1,
        1,
        2,
        2,
        "digit_height",
        ["upper_loop", "lower_loop", "two_counters", "central_waist"],
        ["counter_collapse", "waist_fragment", "loop_boundary_cut"],
        ["upper_lower_balance", "waist_width"],
        "primary",
        "Primary two-counter digit test."
    ),
    glyph_dossier(
        "D_9",
        "9",
        "digit",
        "loop_descending_tail",
        1,
        1,
        1,
        1,
        "digit_height",
        ["upper_loop", "counter", "lower_open_tail"],
        ["counter_collapse", "neck_cut", "tail_fragment"],
        ["loop_size", "tail_angle"],
        "coverage",
        "Tests one upper counter with a descending open continuation."
    )
];
// file: ../lib/schema.scad
//////////////////////////////////////////////////////////////////////
// LibFile: schema.scad
// Project: Glyph Dossier
// FileGroup: Record Schema
// FileSummary: Project, glyph, source, and observation records.
//////////////////////////////////////////////////////////////////////

PR_NAME = 0;
PR_KIND = 1;
PR_EDITION = 2;
PR_SCOPE = 3;
PR_BASELINE = 4;
PR_STATUS = 5;

function glyph_project(
    name,
    kind,
    edition,
    scope,
    baseline,
    status
) = [
    name,
    kind,
    edition,
    scope,
    baseline,
    status
];

GD_ID = 0;
GD_GLYPH = 1;
GD_GROUP = 2;
GD_ARCHETYPE = 3;
GD_COMPONENTS_MIN = 4;
GD_COMPONENTS_MAX = 5;
GD_COUNTERS_MIN = 6;
GD_COUNTERS_MAX = 7;
GD_VERTICAL_CLASS = 8;
GD_FEATURES = 9;
GD_RISKS = 10;
GD_VARIANTS = 11;
GD_PRIORITY = 12;
GD_NOTE = 13;

function glyph_dossier(
    id,
    glyph,
    group,
    archetype,
    components_min,
    components_max,
    counters_min,
    counters_max,
    vertical_class,
    features,
    risks,
    variants,
    priority,
    note
) = [
    id,
    glyph,
    group,
    archetype,
    components_min,
    components_max,
    counters_min,
    counters_max,
    vertical_class,
    features,
    risks,
    variants,
    priority,
    note
];

FS_ID = 0;
FS_KIND = 1;
FS_LABEL = 2;
FS_FONT_NAME = 3;
FS_LICENSE = 4;
FS_URL = 5;
FS_REVISION = 6;
FS_STATUS = 7;

function font_source(
    id,
    kind,
    label,
    font_name,
    license_name,
    source_url,
    revision,
    status
) = [
    id,
    kind,
    label,
    font_name,
    license_name,
    source_url,
    revision,
    status
];

OBS_UNKNOWN = -999999;

OB_ID = 0;
OB_SOURCE_ID = 1;
OB_GLYPH_ID = 2;
OB_STATUS = 3;
OB_VARIANT = 4;
OB_COMPONENTS = 5;
OB_COUNTERS = 6;
OB_LEFT = 7;
OB_RIGHT = 8;
OB_BOTTOM = 9;
OB_TOP = 10;
OB_MIN_STROKE = 11;
OB_MIN_GAP = 12;
OB_NOTE = 13;

function glyph_observation(
    id,
    source_id,
    glyph_id,
    status,
    variant,
    components,
    counters,
    left_extent,
    right_extent,
    bottom_extent,
    top_extent,
    minimum_stroke,
    minimum_gap,
    note
) = [
    id,
    source_id,
    glyph_id,
    status,
    variant,
    components,
    counters,
    left_extent,
    right_extent,
    bottom_extent,
    top_extent,
    minimum_stroke,
    minimum_gap,
    note
];

function observation_value_known(value) =
    value != OBS_UNKNOWN;

function observation_has_bounds(observation) =
    observation_value_known(observation[OB_LEFT])
    && observation_value_known(observation[OB_RIGHT])
    && observation_value_known(observation[OB_BOTTOM])
    && observation_value_known(observation[OB_TOP]);

function observation_width(observation) =
    observation_has_bounds(observation)
    ? observation[OB_RIGHT] - observation[OB_LEFT]
    : OBS_UNKNOWN;

function observation_height(observation) =
    observation_has_bounds(observation)
    ? observation[OB_TOP] - observation[OB_BOTTOM]
    : OBS_UNKNOWN;

function record_name(record) = record[0];
// main file
//////////////////////////////////////////////////////////////////////
// LibFile: a_section_render_contract.scad
// Project: Glyph Dossier
// FileGroup: Contract Tests
// FileSummary: Normalized plan, layout, and section rendering.
//////////////////////////////////////////////////////////////////////

include <../lib/schema.scad>
include <../config/defaults.scad>

include <../registries/uppercase.scad>
include <../registries/lowercase.scad>
include <../registries/digits.scad>
include <../registries/punctuation.scad>
include <../config/glyphs.scad>

include <../registries/laboratory_sources.scad>
include <../config/sources.scad>

include <../config/workbenches.scad>
include <../lib/lookup.scad>
include <../lib/sectioning.scad>
include <../lib/normalization.scad>
include <../lib/validation.scad>

include <../geometry/glyph_profile.scad>
include <../geometry/section_grid.scad>
include <../geometry/a_hazard_map.scad>
include <../geometry/normalized_glyph.scad>
include <../geometry/normalized_profile_scene.scad>
include <../geometry/section_scene.scad>

dossier = named_record(
    ALL_GLYPHS,
    "U_A",
    "A section render dossier"
);

source = named_record(
    FONT_SOURCES,
    "SRC_1",
    "A section render source"
);

validate_normalization(
    dossier,
    "resize",
    600,
    100,
    OBS_UNKNOWN,
    OBS_UNKNOWN,
    OBS_UNKNOWN,
    OBS_UNKNOWN
);

validate_a_section_plan(
    dossier,
    200,
    200,
    3,
    3,
    1,
    1,
    0.05,
    220,
    220,
    0.96,
    0.28,
    0.62,
    0.40,
    0.17
);

translate([-700, 0, 0])
    render_a_section_plan(
        dossier,
        source,
        "resize",
        600,
        100,
        6,
        OBS_UNKNOWN,
        OBS_UNKNOWN,
        OBS_UNKNOWN,
        OBS_UNKNOWN,
        -300,
        0,
        200,
        200,
        3,
        3,
        true,
        true,
        true,
        1.2,
        5,
        1.5,
        0.96,
        0.28,
        0.62,
        0.40,
        0.17
    );

translate([100, 0, 0])
    render_a_section_layout(
        dossier,
        source,
        "resize",
        600,
        100,
        6,
        OBS_UNKNOWN,
        OBS_UNKNOWN,
        OBS_UNKNOWN,
        OBS_UNKNOWN,
        -300,
        0,
        200,
        200,
        3,
        3,
        0.05,
        20
    );

translate([850, 0, 0])
    render_a_section_export(
        dossier,
        source,
        "resize",
        600,
        100,
        6,
        OBS_UNKNOWN,
        OBS_UNKNOWN,
        OBS_UNKNOWN,
        OBS_UNKNOWN,
        -300,
        0,
        200,
        200,
        1,
        1,
        0.05
    );

echo("PASS", "a_section_render_contract");
